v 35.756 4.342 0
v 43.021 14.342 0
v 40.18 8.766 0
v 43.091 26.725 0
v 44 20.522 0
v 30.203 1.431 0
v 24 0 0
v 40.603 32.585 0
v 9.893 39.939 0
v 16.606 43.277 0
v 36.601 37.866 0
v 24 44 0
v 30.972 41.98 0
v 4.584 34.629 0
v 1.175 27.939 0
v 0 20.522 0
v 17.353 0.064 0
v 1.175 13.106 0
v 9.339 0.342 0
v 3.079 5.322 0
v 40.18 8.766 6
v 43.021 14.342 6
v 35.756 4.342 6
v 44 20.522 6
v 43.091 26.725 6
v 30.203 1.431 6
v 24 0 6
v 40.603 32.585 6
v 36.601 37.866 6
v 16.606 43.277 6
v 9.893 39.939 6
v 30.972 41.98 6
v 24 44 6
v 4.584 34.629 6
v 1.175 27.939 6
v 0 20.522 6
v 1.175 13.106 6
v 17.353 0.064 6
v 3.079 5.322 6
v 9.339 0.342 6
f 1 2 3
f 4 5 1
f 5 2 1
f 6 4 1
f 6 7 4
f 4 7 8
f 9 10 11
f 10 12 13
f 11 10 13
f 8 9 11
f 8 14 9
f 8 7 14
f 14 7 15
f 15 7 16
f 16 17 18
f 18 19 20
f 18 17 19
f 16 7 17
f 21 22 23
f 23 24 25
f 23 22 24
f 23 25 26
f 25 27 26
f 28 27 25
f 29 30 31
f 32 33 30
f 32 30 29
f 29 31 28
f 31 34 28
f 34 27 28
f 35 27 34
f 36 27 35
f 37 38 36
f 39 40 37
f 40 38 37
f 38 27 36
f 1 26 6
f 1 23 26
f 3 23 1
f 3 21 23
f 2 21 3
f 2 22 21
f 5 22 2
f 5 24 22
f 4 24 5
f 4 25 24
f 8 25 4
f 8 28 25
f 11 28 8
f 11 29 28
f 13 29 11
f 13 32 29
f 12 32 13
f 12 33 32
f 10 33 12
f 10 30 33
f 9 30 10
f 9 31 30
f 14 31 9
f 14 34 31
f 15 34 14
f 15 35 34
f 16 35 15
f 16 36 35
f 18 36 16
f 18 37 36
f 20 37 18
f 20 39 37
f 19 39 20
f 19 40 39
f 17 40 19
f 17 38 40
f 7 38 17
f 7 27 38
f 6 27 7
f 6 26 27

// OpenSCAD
$fn = 32;

// ----------------------------------------------------------------------
// Cam disc: base radius 20.0 mm, lift 4.0 mm, 20 profile points
// ----------------------------------------------------------------------

// --- parameters (mm) ---
profile_height = 6;       // extrusion height
profile_points = 20;      // points of the closed outline

profile = [[44, 20.522], [43.091, 26.725], [40.603, 32.585], [36.601, 37.866], [30.972, 41.98], [24, 44], [16.606, 43.277], [9.893, 39.939], [4.584, 34.629], [1.175, 27.939], [0, 20.522], [1.175, 13.106], [3.079, 5.322], [9.339, 0.342], [17.353, 0.064], [24, 0], [30.203, 1.431], [35.756, 4.342], [40.18, 8.766], [43.021, 14.342]];  // single closed polygon, 20 points, counter clockwise

// --- the one profile operation ---
linear_extrude(height = profile_height) polygon(points = profile);
